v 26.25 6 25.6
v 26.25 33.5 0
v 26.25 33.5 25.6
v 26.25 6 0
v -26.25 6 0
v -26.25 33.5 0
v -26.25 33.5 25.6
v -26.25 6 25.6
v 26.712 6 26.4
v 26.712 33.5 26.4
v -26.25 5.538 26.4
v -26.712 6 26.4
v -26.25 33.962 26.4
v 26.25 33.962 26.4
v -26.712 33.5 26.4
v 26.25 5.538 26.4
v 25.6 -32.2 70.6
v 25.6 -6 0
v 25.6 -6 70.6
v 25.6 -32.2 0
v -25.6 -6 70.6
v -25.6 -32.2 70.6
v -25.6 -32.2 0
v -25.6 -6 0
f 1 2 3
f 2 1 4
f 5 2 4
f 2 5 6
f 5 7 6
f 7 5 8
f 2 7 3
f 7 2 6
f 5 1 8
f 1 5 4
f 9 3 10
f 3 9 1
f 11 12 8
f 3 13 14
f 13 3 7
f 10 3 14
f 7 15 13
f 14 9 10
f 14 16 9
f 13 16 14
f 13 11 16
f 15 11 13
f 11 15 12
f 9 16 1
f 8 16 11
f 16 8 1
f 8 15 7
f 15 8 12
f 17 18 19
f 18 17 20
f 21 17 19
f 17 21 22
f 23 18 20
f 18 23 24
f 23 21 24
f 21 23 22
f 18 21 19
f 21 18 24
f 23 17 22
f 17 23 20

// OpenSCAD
/* Customizable vase mode box
 * By DrLex, v1.1 2020/05
 * Released under Creative Commons - Attribution - Share Alike license */

/* [General] */
// What model to generate. When using 'both', don't forget to split into two parts before starting vase mode prints.
render = "both"; //[box, lid, both]

/* [Dimensions] */
// Inner width of the box. All dimensions are mm.
width = 50.0; //[1:0.1:250]

// Inner depth of the box.
depth = 25.0; //[1:0.1:250]

// Inner height of the box.
height = 70.0; //[1:0.1:250]

// Overlap of the lid when placed on the box.
lid = 25.0; //[1:0.1:50]

// Total extra gap between the box and lid. You may need to try a few different values to get a perfect fit that is neither too loose nor too tight.
tolerance = 0.1; //[0:0.01:1]

// Wall thickness of the box. You must set wall thickness for vase mode in your slicer program to this same value when printing, and also set number of bottom layers such that vase mode starts above this height.
wall = 0.60; //[0.2:0.01:2]

/* [Shape] */
// Box shape
shape = "rectangle"; //[rectangle, cylinder]

// Rounded corner radius for rectangle shape
corner = 0; //[0:0.1:125]

// Number of segments for the cylinder shape (also controls smoothness of rounded corners, but then it is rounded to the nearest multiple of 4)
cylinder_segments = 64; //[3:128]

/* [Hidden] */
box_width = width + 2 * wall;
box_depth = depth + 2 * wall;
box_height = height + wall;
lid_width = box_width + tolerance + 2 * wall;
lid_depth = box_depth + tolerance + 2 * wall;
lid_height = lid + wall;
ridge_h = 0.8;
ridge_a = 30;  // angle of the ridge
ridge_r = tan(ridge_a) * ridge_h;  // cone radius needed to obtain angle
corner_r = min(corner, box_width/2, box_depth/2);
corner_r_lid = corner_r + wall;
segm = corner == 0 ? cylinder_segments : 4*round(cylinder_segments/4);


module rounded_box(width, depth, height, rad)
{
    wid2 = width - rad;
    dep2 = depth - rad;
    // A hull() of if/else statements proves terribly inefficient, hence put hull inside if/else
    if(2*rad >= width) {
        hull() {
            translate([rad, rad, 0]) cylinder(h=height, r=rad, $fn=segm);
            translate([rad, dep2, 0]) cylinder(h=height, r=rad, $fn=segm);
        }
    }
    else if(2*rad >= depth) {
        hull() {
            translate([rad, rad, 0]) cylinder(h=height, r=rad, $fn=segm);
            translate([wid2, rad, 0]) cylinder(h=height, r=rad, $fn=segm);
        }
    }
    else {
        hull() {
            translate([rad, rad, 0]) cylinder(h=height, r=rad, $fn=segm);
            translate([wid2, rad, 0]) cylinder(h=height, r=rad, $fn=segm);
            translate([wid2, dep2, 0]) cylinder(h=height, r=rad, $fn=segm);
            translate([rad, dep2, 0]) cylinder(h=height, r=rad, $fn=segm);
        }
    }
}

module rounded_lip(width, depth, height, rad, ridge)
{
    wid2 = width - rad;
    dep2 = depth - rad;
    rad2 = rad + ridge;
    if(2*rad >= width) {
        hull() {
            translate([rad, rad, 0]) cylinder(h=height, r1=rad, r2=rad2, $fn=segm);
            translate([rad, dep2, 0]) cylinder(h=height, r1=rad, r2=rad2, $fn=segm);
        }
    }
    else if(2*rad >= depth) {
        hull() {
            translate([rad, rad, 0]) cylinder(h=height, r1=rad, r2=rad2, $fn=segm);
            translate([wid2, rad, 0]) cylinder(h=height, r1=rad, r2=rad2, $fn=segm);
        }
    }
    else {
        hull() {
            translate([rad, rad, 0]) cylinder(h=height, r1=rad, r2=rad2, $fn=segm);
            translate([wid2, rad, 0]) cylinder(h=height, r1=rad, r2=rad2, $fn=segm);
            translate([wid2, dep2, 0]) cylinder(h=height, r1=rad, r2=rad2, $fn=segm);
            translate([rad, dep2, 0]) cylinder(h=height, r1=rad, r2=rad2, $fn=segm);
        }
    }
}


if(shape == "rectangle") {
    shift_box = render == "both" ? -(box_depth + 6) : -box_depth/2;
    shift_lid = render == "both" ? 6 : -lid_depth/2;

    if(render == "box" || render == "both") {
        translate([-box_width/2, shift_box, 0]) {
            if(corner_r == 0) {
                cube([box_width, box_depth, box_height]);
            }
            else {
                hull() {
                    rounded_box(box_width, box_depth, box_height,  corner_r);
                }
            }
        }
    }

    if(render == "lid" || render == "both") {
        translate([-lid_width/2, shift_lid, 0]) {
            if(corner_r == 0) {
                cube([lid_width, lid_depth, lid_height]);
                translate([0, 0, lid_height]) hull() {
                    cylinder(ridge_h, 0, ridge_r, $fn=4);
                    translate([lid_width, 0, 0]) cylinder(ridge_h, 0, ridge_r, $fn=4);
                    translate([lid_width, lid_depth, 0]) cylinder(ridge_h, 0, ridge_r, $fn=4);
                    translate([0, lid_depth, 0]) cylinder(ridge_h, 0, ridge_r, $fn=4);
                }
            }
            else {
                rounded_box(lid_width, lid_depth, lid_height,  corner_r_lid);
                translate([0, 0, lid_height]) rounded_lip(lid_width, lid_depth, ridge_h, corner_r_lid, ridge_r);
            }
        }
    }
}
else {
    shift_box = render == "both" ? -(box_depth/2 + 6) : 0;
    shift_lid = render == "both" ? lid_depth/2 + 6 : 0;

    if(render == "box" || render == "both") {
        scale_y_b = box_depth / box_width;
        translate([0, shift_box, 0]) scale([1, scale_y_b, 1]) cylinder(box_height, box_width/2, box_width/2, $fn=segm);
    }

    if(render == "lid" || render == "both") {
        scale_y_l = lid_depth / lid_width;
        translate([0, shift_lid, 0]) {
            scale([1, scale_y_l, 1]) {
                cylinder(lid_height, lid_width/2, lid_width/2, $fn=segm);
            }
            // unfortunately hull cannot make a 3D shape out of two 2D circles, so make a 3D contraption instead
            translate([0, 0, lid_height]) scale([1, scale_y_l, 1]) hull() {
                cylinder(ridge_h/2, lid_width/2, lid_width/2, $fn=segm);
                undo_scale = (lid_width/2 * scale_y_l + ridge_r) / (scale_y_l * (lid_width/2 + ridge_r));
                scale([1, undo_scale, 1]) cylinder(ridge_h, 0, lid_width/2 + ridge_r, $fn=segm);
            }
        }
    }
}
